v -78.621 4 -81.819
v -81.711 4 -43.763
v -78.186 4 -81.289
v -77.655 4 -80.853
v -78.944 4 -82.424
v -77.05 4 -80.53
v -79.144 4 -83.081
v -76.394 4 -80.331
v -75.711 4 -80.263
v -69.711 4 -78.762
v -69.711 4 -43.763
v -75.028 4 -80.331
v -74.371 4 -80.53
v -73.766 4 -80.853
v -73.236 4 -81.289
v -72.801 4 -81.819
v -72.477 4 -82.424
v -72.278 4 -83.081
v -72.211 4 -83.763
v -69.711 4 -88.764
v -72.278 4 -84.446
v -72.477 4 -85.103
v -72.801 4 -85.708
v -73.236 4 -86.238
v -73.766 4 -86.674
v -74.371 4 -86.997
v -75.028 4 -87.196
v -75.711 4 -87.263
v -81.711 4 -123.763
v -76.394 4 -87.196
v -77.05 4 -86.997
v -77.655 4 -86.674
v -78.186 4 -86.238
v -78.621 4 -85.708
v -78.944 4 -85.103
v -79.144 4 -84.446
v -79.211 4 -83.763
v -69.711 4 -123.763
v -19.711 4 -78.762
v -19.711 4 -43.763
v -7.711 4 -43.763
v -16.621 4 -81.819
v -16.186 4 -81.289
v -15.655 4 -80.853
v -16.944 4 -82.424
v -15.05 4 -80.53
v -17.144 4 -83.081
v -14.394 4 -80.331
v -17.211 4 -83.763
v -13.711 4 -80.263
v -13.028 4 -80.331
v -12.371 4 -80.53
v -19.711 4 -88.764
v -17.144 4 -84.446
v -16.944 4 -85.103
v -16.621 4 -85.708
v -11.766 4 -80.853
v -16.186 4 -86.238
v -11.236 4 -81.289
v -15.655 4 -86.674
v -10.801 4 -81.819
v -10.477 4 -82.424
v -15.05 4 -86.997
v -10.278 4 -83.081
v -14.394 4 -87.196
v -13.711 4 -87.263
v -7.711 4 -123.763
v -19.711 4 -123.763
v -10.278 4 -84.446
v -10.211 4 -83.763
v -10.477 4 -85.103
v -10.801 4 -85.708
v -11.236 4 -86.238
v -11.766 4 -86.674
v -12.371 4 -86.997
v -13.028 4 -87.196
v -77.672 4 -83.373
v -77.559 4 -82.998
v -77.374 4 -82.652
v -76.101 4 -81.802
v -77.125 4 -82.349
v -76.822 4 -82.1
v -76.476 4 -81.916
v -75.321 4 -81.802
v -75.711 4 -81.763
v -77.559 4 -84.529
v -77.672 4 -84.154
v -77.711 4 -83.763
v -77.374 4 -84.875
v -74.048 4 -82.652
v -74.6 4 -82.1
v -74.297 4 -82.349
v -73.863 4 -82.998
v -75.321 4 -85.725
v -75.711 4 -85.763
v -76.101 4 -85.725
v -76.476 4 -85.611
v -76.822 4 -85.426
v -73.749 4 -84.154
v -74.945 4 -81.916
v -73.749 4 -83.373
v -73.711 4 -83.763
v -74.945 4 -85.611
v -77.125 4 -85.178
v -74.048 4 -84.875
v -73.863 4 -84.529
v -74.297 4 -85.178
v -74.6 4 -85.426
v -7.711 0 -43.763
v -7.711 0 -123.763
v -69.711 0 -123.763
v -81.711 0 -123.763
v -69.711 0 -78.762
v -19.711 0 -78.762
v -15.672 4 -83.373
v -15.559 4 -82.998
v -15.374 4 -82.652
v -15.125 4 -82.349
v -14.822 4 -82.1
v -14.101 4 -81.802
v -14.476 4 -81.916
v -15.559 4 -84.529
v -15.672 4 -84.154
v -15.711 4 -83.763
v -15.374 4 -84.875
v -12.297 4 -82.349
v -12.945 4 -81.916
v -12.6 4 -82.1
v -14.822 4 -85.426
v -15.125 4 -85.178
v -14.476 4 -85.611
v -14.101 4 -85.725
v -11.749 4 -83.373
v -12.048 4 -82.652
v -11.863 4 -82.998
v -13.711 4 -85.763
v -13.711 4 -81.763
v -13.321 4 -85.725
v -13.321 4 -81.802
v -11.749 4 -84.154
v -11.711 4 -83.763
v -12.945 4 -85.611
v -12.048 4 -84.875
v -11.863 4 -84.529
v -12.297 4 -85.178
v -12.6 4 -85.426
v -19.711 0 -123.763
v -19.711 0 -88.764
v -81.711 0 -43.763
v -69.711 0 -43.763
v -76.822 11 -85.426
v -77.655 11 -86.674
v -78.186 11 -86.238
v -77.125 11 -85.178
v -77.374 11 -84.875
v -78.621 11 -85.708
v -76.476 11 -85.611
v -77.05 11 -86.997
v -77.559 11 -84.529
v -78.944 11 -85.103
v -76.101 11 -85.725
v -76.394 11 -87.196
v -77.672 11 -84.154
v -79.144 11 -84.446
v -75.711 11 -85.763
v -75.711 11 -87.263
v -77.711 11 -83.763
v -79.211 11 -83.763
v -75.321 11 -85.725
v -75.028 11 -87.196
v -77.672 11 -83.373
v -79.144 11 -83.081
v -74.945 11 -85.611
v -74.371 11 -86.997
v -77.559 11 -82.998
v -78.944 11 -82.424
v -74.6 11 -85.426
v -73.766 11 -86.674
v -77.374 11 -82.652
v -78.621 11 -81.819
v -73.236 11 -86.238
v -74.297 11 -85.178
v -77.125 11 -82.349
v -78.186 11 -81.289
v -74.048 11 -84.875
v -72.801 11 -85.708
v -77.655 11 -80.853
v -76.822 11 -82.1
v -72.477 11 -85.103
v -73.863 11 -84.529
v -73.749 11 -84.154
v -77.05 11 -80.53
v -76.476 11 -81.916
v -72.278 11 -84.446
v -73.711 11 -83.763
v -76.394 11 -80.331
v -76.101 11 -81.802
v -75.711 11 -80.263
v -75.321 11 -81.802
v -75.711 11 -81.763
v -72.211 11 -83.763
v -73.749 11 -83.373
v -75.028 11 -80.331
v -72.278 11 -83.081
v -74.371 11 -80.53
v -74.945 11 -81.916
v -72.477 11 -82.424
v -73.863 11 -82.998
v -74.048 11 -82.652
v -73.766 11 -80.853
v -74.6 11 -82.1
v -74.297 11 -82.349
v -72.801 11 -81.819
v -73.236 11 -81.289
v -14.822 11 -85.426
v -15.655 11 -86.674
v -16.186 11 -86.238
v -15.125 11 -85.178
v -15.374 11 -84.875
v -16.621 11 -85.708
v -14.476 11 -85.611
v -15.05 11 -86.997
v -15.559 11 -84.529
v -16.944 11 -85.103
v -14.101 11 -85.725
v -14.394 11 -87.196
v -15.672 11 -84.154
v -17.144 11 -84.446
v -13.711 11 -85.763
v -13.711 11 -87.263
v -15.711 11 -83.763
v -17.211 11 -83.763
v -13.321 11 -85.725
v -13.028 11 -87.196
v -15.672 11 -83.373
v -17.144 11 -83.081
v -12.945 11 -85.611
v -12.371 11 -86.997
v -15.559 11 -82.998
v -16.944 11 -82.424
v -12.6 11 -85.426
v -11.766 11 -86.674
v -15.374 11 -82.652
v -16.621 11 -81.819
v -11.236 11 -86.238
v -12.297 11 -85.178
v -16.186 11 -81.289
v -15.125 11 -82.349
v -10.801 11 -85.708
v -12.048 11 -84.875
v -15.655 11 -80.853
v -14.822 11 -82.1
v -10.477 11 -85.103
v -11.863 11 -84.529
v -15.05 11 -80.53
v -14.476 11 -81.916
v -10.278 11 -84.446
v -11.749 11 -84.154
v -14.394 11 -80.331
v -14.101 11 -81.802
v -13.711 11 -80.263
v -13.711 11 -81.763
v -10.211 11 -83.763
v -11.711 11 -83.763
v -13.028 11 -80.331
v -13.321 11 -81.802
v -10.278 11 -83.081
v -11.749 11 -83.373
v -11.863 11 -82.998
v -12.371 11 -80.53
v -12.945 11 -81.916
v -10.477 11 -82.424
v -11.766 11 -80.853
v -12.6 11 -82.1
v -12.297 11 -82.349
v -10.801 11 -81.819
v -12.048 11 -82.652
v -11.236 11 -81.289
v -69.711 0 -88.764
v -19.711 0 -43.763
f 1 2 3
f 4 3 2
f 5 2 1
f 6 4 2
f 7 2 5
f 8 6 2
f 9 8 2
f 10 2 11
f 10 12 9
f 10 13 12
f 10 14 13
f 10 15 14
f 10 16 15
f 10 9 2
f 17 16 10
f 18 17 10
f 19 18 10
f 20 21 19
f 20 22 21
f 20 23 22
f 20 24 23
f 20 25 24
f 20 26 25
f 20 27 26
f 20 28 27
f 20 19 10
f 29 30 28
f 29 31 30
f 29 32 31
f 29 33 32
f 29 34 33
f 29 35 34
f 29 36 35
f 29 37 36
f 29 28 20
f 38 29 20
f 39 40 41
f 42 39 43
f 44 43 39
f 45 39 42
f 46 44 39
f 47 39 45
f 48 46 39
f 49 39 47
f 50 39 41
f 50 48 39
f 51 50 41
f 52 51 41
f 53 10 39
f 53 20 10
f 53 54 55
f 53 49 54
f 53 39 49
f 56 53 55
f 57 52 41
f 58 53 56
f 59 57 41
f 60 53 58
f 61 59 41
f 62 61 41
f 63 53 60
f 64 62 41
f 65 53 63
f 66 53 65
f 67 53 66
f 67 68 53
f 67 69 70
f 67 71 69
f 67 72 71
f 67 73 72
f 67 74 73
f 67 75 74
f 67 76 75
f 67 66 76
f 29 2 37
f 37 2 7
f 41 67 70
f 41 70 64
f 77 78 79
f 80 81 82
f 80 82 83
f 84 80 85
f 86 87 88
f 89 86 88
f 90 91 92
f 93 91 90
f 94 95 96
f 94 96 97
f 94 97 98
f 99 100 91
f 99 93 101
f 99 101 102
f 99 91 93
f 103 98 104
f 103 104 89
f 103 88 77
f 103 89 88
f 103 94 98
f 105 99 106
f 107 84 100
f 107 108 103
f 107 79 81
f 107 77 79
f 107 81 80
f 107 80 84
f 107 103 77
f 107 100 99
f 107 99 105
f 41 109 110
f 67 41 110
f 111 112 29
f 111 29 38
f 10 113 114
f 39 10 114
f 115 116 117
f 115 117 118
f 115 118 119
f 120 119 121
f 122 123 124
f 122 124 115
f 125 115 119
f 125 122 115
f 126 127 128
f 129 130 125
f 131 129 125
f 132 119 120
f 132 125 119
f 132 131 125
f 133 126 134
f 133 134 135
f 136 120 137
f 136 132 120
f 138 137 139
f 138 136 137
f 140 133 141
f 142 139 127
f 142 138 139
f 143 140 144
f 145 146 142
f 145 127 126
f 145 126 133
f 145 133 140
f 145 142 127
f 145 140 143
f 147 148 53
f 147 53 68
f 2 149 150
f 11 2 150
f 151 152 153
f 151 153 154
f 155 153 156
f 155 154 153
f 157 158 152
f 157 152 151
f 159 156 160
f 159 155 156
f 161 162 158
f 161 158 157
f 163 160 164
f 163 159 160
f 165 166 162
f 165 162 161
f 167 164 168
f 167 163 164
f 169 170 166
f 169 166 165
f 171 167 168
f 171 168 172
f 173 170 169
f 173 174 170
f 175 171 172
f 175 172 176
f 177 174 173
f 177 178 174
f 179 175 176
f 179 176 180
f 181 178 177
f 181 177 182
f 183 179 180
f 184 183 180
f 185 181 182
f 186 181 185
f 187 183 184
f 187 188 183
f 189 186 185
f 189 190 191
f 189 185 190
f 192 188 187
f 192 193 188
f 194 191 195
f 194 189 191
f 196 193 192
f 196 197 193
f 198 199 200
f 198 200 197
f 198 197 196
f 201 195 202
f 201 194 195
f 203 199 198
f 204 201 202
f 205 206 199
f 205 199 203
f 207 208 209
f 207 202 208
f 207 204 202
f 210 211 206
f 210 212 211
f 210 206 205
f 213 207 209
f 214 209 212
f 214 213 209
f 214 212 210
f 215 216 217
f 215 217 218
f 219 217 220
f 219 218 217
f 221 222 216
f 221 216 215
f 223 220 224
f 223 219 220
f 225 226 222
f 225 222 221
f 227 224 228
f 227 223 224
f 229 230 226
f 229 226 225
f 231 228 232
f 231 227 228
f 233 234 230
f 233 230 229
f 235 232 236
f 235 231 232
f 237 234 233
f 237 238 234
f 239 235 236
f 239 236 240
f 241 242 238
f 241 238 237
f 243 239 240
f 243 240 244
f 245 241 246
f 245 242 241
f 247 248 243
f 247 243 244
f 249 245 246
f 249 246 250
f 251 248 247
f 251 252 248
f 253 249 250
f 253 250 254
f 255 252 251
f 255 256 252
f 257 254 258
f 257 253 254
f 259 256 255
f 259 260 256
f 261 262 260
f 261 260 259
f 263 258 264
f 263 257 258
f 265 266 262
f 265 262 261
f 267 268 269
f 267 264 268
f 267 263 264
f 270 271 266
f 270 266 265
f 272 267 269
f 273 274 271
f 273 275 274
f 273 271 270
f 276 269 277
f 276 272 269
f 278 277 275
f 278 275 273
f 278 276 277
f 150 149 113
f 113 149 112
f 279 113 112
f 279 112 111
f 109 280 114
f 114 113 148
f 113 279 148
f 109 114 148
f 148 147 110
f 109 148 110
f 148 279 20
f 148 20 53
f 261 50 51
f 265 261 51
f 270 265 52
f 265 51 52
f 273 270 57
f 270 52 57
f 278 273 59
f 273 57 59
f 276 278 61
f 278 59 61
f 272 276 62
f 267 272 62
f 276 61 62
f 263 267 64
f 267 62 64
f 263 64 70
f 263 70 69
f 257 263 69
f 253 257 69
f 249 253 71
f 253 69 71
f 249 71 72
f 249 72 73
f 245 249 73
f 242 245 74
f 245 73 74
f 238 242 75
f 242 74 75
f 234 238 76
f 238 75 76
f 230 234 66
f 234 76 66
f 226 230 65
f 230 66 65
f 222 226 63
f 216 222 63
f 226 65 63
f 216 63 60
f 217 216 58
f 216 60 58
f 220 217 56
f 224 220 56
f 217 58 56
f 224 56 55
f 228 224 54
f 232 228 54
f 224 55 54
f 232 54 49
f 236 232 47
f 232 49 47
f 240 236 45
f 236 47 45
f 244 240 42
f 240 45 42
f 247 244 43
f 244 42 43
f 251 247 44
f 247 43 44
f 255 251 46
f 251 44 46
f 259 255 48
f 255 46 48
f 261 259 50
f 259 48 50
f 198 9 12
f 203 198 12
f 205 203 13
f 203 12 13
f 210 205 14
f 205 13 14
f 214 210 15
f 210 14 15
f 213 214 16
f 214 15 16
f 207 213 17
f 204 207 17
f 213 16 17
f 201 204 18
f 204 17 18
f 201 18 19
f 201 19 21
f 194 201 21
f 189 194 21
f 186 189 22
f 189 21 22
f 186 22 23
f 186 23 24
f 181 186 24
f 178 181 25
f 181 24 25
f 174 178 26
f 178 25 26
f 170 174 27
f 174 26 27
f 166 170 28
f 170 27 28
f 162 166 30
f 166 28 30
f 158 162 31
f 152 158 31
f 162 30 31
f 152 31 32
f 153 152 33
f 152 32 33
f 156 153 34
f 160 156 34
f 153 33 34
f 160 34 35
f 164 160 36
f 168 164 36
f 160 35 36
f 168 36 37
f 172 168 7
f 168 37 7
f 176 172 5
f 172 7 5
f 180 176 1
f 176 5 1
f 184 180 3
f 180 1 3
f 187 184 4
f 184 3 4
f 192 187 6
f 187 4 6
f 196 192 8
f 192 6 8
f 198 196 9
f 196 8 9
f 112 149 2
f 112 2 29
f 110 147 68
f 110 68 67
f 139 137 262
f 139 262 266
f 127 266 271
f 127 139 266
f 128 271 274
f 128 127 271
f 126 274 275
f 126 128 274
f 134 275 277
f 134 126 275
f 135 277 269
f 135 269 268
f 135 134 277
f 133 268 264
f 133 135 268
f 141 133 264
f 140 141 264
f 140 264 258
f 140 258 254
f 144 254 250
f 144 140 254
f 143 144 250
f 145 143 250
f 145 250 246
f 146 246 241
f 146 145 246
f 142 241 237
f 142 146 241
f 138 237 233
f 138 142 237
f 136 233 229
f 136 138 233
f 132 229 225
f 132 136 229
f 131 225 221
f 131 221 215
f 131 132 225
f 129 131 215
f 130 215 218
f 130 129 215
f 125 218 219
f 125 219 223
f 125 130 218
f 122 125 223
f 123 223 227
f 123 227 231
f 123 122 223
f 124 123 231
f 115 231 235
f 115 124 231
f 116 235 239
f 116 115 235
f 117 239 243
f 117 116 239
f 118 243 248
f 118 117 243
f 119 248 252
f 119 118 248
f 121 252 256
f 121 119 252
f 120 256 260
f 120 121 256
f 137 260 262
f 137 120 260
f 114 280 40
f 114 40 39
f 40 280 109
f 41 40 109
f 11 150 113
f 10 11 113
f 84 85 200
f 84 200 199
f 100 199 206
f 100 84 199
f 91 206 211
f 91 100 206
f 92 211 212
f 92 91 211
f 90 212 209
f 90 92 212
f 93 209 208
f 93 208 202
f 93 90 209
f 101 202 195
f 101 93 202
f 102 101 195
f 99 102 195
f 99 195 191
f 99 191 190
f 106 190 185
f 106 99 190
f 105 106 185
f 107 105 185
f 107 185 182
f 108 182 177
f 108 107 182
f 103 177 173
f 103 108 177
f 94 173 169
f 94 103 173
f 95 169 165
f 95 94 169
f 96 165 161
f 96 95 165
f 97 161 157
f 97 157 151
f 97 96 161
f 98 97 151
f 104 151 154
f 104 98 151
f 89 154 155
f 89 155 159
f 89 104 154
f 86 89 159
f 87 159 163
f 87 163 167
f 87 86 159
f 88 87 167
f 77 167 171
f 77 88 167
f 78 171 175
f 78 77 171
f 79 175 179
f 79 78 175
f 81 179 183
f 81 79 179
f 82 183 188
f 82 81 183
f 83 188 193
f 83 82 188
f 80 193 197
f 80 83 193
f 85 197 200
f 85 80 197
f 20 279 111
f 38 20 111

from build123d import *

# Parameters (mm, degrees)
SKETCH3_W           = 12
SKETCH3_H           = 80
SKETCH3_W_2         = 50
SKETCH3_H_2         = 10.001862112
BOSS_EXTRUDE1_DEPTH = 4
SKETCH4_R           = 3.5
SKETCH4_R_2         = 2
BOSS_EXTRUDE2_DEPTH = 7


with BuildPart() as part:
    # Sketch3 → Boss-Extrude1 (new body)
    with BuildSketch(Plane(origin=(0, 0, 0), x_dir=(1, 0, 0), z_dir=(0, 1, 0))):
        with Locations((-75.710799504, 83.763400912)):
            Rectangle(SKETCH3_W, SKETCH3_H)
        with Locations((-44.710799504, 83.763400912)):
            Rectangle(SKETCH3_W_2, SKETCH3_H_2)
        with Locations((-13.710799504, 83.763400912)):
            Rectangle(SKETCH3_W, SKETCH3_H)
    extrude(amount=BOSS_EXTRUDE1_DEPTH)

    # Sketch4 → Boss-Extrude2 (add)
    # profile 1 of 2: a face of its own
    with BuildSketch(Plane(origin=(0, 4, 0), x_dir=(1, 0, 0), z_dir=(0, 1, 0))):
        with Locations(Location((-75.710799504, 83.763400912, 0), (0, 0, 270))):
            Circle(SKETCH4_R)
        with Locations(Location((-75.710799504, 83.763400912, 0), (0, 0, 270))):
            Circle(SKETCH4_R_2, mode=Mode.SUBTRACT)
    # profile 2 of 2: a face of its own
    with BuildSketch(Plane(origin=(0, 4, 0), x_dir=(1, 0, 0), z_dir=(0, 1, 0))):
        with Locations(Location((-13.710799504, 83.763400912, 0), (0, 0, 270))):
            Circle(SKETCH4_R)
        with Locations(Location((-13.710799504, 83.763400912, 0), (0, 0, 270))):
            Circle(SKETCH4_R_2, mode=Mode.SUBTRACT)
    extrude(amount=BOSS_EXTRUDE2_DEPTH)


solid = part.part
